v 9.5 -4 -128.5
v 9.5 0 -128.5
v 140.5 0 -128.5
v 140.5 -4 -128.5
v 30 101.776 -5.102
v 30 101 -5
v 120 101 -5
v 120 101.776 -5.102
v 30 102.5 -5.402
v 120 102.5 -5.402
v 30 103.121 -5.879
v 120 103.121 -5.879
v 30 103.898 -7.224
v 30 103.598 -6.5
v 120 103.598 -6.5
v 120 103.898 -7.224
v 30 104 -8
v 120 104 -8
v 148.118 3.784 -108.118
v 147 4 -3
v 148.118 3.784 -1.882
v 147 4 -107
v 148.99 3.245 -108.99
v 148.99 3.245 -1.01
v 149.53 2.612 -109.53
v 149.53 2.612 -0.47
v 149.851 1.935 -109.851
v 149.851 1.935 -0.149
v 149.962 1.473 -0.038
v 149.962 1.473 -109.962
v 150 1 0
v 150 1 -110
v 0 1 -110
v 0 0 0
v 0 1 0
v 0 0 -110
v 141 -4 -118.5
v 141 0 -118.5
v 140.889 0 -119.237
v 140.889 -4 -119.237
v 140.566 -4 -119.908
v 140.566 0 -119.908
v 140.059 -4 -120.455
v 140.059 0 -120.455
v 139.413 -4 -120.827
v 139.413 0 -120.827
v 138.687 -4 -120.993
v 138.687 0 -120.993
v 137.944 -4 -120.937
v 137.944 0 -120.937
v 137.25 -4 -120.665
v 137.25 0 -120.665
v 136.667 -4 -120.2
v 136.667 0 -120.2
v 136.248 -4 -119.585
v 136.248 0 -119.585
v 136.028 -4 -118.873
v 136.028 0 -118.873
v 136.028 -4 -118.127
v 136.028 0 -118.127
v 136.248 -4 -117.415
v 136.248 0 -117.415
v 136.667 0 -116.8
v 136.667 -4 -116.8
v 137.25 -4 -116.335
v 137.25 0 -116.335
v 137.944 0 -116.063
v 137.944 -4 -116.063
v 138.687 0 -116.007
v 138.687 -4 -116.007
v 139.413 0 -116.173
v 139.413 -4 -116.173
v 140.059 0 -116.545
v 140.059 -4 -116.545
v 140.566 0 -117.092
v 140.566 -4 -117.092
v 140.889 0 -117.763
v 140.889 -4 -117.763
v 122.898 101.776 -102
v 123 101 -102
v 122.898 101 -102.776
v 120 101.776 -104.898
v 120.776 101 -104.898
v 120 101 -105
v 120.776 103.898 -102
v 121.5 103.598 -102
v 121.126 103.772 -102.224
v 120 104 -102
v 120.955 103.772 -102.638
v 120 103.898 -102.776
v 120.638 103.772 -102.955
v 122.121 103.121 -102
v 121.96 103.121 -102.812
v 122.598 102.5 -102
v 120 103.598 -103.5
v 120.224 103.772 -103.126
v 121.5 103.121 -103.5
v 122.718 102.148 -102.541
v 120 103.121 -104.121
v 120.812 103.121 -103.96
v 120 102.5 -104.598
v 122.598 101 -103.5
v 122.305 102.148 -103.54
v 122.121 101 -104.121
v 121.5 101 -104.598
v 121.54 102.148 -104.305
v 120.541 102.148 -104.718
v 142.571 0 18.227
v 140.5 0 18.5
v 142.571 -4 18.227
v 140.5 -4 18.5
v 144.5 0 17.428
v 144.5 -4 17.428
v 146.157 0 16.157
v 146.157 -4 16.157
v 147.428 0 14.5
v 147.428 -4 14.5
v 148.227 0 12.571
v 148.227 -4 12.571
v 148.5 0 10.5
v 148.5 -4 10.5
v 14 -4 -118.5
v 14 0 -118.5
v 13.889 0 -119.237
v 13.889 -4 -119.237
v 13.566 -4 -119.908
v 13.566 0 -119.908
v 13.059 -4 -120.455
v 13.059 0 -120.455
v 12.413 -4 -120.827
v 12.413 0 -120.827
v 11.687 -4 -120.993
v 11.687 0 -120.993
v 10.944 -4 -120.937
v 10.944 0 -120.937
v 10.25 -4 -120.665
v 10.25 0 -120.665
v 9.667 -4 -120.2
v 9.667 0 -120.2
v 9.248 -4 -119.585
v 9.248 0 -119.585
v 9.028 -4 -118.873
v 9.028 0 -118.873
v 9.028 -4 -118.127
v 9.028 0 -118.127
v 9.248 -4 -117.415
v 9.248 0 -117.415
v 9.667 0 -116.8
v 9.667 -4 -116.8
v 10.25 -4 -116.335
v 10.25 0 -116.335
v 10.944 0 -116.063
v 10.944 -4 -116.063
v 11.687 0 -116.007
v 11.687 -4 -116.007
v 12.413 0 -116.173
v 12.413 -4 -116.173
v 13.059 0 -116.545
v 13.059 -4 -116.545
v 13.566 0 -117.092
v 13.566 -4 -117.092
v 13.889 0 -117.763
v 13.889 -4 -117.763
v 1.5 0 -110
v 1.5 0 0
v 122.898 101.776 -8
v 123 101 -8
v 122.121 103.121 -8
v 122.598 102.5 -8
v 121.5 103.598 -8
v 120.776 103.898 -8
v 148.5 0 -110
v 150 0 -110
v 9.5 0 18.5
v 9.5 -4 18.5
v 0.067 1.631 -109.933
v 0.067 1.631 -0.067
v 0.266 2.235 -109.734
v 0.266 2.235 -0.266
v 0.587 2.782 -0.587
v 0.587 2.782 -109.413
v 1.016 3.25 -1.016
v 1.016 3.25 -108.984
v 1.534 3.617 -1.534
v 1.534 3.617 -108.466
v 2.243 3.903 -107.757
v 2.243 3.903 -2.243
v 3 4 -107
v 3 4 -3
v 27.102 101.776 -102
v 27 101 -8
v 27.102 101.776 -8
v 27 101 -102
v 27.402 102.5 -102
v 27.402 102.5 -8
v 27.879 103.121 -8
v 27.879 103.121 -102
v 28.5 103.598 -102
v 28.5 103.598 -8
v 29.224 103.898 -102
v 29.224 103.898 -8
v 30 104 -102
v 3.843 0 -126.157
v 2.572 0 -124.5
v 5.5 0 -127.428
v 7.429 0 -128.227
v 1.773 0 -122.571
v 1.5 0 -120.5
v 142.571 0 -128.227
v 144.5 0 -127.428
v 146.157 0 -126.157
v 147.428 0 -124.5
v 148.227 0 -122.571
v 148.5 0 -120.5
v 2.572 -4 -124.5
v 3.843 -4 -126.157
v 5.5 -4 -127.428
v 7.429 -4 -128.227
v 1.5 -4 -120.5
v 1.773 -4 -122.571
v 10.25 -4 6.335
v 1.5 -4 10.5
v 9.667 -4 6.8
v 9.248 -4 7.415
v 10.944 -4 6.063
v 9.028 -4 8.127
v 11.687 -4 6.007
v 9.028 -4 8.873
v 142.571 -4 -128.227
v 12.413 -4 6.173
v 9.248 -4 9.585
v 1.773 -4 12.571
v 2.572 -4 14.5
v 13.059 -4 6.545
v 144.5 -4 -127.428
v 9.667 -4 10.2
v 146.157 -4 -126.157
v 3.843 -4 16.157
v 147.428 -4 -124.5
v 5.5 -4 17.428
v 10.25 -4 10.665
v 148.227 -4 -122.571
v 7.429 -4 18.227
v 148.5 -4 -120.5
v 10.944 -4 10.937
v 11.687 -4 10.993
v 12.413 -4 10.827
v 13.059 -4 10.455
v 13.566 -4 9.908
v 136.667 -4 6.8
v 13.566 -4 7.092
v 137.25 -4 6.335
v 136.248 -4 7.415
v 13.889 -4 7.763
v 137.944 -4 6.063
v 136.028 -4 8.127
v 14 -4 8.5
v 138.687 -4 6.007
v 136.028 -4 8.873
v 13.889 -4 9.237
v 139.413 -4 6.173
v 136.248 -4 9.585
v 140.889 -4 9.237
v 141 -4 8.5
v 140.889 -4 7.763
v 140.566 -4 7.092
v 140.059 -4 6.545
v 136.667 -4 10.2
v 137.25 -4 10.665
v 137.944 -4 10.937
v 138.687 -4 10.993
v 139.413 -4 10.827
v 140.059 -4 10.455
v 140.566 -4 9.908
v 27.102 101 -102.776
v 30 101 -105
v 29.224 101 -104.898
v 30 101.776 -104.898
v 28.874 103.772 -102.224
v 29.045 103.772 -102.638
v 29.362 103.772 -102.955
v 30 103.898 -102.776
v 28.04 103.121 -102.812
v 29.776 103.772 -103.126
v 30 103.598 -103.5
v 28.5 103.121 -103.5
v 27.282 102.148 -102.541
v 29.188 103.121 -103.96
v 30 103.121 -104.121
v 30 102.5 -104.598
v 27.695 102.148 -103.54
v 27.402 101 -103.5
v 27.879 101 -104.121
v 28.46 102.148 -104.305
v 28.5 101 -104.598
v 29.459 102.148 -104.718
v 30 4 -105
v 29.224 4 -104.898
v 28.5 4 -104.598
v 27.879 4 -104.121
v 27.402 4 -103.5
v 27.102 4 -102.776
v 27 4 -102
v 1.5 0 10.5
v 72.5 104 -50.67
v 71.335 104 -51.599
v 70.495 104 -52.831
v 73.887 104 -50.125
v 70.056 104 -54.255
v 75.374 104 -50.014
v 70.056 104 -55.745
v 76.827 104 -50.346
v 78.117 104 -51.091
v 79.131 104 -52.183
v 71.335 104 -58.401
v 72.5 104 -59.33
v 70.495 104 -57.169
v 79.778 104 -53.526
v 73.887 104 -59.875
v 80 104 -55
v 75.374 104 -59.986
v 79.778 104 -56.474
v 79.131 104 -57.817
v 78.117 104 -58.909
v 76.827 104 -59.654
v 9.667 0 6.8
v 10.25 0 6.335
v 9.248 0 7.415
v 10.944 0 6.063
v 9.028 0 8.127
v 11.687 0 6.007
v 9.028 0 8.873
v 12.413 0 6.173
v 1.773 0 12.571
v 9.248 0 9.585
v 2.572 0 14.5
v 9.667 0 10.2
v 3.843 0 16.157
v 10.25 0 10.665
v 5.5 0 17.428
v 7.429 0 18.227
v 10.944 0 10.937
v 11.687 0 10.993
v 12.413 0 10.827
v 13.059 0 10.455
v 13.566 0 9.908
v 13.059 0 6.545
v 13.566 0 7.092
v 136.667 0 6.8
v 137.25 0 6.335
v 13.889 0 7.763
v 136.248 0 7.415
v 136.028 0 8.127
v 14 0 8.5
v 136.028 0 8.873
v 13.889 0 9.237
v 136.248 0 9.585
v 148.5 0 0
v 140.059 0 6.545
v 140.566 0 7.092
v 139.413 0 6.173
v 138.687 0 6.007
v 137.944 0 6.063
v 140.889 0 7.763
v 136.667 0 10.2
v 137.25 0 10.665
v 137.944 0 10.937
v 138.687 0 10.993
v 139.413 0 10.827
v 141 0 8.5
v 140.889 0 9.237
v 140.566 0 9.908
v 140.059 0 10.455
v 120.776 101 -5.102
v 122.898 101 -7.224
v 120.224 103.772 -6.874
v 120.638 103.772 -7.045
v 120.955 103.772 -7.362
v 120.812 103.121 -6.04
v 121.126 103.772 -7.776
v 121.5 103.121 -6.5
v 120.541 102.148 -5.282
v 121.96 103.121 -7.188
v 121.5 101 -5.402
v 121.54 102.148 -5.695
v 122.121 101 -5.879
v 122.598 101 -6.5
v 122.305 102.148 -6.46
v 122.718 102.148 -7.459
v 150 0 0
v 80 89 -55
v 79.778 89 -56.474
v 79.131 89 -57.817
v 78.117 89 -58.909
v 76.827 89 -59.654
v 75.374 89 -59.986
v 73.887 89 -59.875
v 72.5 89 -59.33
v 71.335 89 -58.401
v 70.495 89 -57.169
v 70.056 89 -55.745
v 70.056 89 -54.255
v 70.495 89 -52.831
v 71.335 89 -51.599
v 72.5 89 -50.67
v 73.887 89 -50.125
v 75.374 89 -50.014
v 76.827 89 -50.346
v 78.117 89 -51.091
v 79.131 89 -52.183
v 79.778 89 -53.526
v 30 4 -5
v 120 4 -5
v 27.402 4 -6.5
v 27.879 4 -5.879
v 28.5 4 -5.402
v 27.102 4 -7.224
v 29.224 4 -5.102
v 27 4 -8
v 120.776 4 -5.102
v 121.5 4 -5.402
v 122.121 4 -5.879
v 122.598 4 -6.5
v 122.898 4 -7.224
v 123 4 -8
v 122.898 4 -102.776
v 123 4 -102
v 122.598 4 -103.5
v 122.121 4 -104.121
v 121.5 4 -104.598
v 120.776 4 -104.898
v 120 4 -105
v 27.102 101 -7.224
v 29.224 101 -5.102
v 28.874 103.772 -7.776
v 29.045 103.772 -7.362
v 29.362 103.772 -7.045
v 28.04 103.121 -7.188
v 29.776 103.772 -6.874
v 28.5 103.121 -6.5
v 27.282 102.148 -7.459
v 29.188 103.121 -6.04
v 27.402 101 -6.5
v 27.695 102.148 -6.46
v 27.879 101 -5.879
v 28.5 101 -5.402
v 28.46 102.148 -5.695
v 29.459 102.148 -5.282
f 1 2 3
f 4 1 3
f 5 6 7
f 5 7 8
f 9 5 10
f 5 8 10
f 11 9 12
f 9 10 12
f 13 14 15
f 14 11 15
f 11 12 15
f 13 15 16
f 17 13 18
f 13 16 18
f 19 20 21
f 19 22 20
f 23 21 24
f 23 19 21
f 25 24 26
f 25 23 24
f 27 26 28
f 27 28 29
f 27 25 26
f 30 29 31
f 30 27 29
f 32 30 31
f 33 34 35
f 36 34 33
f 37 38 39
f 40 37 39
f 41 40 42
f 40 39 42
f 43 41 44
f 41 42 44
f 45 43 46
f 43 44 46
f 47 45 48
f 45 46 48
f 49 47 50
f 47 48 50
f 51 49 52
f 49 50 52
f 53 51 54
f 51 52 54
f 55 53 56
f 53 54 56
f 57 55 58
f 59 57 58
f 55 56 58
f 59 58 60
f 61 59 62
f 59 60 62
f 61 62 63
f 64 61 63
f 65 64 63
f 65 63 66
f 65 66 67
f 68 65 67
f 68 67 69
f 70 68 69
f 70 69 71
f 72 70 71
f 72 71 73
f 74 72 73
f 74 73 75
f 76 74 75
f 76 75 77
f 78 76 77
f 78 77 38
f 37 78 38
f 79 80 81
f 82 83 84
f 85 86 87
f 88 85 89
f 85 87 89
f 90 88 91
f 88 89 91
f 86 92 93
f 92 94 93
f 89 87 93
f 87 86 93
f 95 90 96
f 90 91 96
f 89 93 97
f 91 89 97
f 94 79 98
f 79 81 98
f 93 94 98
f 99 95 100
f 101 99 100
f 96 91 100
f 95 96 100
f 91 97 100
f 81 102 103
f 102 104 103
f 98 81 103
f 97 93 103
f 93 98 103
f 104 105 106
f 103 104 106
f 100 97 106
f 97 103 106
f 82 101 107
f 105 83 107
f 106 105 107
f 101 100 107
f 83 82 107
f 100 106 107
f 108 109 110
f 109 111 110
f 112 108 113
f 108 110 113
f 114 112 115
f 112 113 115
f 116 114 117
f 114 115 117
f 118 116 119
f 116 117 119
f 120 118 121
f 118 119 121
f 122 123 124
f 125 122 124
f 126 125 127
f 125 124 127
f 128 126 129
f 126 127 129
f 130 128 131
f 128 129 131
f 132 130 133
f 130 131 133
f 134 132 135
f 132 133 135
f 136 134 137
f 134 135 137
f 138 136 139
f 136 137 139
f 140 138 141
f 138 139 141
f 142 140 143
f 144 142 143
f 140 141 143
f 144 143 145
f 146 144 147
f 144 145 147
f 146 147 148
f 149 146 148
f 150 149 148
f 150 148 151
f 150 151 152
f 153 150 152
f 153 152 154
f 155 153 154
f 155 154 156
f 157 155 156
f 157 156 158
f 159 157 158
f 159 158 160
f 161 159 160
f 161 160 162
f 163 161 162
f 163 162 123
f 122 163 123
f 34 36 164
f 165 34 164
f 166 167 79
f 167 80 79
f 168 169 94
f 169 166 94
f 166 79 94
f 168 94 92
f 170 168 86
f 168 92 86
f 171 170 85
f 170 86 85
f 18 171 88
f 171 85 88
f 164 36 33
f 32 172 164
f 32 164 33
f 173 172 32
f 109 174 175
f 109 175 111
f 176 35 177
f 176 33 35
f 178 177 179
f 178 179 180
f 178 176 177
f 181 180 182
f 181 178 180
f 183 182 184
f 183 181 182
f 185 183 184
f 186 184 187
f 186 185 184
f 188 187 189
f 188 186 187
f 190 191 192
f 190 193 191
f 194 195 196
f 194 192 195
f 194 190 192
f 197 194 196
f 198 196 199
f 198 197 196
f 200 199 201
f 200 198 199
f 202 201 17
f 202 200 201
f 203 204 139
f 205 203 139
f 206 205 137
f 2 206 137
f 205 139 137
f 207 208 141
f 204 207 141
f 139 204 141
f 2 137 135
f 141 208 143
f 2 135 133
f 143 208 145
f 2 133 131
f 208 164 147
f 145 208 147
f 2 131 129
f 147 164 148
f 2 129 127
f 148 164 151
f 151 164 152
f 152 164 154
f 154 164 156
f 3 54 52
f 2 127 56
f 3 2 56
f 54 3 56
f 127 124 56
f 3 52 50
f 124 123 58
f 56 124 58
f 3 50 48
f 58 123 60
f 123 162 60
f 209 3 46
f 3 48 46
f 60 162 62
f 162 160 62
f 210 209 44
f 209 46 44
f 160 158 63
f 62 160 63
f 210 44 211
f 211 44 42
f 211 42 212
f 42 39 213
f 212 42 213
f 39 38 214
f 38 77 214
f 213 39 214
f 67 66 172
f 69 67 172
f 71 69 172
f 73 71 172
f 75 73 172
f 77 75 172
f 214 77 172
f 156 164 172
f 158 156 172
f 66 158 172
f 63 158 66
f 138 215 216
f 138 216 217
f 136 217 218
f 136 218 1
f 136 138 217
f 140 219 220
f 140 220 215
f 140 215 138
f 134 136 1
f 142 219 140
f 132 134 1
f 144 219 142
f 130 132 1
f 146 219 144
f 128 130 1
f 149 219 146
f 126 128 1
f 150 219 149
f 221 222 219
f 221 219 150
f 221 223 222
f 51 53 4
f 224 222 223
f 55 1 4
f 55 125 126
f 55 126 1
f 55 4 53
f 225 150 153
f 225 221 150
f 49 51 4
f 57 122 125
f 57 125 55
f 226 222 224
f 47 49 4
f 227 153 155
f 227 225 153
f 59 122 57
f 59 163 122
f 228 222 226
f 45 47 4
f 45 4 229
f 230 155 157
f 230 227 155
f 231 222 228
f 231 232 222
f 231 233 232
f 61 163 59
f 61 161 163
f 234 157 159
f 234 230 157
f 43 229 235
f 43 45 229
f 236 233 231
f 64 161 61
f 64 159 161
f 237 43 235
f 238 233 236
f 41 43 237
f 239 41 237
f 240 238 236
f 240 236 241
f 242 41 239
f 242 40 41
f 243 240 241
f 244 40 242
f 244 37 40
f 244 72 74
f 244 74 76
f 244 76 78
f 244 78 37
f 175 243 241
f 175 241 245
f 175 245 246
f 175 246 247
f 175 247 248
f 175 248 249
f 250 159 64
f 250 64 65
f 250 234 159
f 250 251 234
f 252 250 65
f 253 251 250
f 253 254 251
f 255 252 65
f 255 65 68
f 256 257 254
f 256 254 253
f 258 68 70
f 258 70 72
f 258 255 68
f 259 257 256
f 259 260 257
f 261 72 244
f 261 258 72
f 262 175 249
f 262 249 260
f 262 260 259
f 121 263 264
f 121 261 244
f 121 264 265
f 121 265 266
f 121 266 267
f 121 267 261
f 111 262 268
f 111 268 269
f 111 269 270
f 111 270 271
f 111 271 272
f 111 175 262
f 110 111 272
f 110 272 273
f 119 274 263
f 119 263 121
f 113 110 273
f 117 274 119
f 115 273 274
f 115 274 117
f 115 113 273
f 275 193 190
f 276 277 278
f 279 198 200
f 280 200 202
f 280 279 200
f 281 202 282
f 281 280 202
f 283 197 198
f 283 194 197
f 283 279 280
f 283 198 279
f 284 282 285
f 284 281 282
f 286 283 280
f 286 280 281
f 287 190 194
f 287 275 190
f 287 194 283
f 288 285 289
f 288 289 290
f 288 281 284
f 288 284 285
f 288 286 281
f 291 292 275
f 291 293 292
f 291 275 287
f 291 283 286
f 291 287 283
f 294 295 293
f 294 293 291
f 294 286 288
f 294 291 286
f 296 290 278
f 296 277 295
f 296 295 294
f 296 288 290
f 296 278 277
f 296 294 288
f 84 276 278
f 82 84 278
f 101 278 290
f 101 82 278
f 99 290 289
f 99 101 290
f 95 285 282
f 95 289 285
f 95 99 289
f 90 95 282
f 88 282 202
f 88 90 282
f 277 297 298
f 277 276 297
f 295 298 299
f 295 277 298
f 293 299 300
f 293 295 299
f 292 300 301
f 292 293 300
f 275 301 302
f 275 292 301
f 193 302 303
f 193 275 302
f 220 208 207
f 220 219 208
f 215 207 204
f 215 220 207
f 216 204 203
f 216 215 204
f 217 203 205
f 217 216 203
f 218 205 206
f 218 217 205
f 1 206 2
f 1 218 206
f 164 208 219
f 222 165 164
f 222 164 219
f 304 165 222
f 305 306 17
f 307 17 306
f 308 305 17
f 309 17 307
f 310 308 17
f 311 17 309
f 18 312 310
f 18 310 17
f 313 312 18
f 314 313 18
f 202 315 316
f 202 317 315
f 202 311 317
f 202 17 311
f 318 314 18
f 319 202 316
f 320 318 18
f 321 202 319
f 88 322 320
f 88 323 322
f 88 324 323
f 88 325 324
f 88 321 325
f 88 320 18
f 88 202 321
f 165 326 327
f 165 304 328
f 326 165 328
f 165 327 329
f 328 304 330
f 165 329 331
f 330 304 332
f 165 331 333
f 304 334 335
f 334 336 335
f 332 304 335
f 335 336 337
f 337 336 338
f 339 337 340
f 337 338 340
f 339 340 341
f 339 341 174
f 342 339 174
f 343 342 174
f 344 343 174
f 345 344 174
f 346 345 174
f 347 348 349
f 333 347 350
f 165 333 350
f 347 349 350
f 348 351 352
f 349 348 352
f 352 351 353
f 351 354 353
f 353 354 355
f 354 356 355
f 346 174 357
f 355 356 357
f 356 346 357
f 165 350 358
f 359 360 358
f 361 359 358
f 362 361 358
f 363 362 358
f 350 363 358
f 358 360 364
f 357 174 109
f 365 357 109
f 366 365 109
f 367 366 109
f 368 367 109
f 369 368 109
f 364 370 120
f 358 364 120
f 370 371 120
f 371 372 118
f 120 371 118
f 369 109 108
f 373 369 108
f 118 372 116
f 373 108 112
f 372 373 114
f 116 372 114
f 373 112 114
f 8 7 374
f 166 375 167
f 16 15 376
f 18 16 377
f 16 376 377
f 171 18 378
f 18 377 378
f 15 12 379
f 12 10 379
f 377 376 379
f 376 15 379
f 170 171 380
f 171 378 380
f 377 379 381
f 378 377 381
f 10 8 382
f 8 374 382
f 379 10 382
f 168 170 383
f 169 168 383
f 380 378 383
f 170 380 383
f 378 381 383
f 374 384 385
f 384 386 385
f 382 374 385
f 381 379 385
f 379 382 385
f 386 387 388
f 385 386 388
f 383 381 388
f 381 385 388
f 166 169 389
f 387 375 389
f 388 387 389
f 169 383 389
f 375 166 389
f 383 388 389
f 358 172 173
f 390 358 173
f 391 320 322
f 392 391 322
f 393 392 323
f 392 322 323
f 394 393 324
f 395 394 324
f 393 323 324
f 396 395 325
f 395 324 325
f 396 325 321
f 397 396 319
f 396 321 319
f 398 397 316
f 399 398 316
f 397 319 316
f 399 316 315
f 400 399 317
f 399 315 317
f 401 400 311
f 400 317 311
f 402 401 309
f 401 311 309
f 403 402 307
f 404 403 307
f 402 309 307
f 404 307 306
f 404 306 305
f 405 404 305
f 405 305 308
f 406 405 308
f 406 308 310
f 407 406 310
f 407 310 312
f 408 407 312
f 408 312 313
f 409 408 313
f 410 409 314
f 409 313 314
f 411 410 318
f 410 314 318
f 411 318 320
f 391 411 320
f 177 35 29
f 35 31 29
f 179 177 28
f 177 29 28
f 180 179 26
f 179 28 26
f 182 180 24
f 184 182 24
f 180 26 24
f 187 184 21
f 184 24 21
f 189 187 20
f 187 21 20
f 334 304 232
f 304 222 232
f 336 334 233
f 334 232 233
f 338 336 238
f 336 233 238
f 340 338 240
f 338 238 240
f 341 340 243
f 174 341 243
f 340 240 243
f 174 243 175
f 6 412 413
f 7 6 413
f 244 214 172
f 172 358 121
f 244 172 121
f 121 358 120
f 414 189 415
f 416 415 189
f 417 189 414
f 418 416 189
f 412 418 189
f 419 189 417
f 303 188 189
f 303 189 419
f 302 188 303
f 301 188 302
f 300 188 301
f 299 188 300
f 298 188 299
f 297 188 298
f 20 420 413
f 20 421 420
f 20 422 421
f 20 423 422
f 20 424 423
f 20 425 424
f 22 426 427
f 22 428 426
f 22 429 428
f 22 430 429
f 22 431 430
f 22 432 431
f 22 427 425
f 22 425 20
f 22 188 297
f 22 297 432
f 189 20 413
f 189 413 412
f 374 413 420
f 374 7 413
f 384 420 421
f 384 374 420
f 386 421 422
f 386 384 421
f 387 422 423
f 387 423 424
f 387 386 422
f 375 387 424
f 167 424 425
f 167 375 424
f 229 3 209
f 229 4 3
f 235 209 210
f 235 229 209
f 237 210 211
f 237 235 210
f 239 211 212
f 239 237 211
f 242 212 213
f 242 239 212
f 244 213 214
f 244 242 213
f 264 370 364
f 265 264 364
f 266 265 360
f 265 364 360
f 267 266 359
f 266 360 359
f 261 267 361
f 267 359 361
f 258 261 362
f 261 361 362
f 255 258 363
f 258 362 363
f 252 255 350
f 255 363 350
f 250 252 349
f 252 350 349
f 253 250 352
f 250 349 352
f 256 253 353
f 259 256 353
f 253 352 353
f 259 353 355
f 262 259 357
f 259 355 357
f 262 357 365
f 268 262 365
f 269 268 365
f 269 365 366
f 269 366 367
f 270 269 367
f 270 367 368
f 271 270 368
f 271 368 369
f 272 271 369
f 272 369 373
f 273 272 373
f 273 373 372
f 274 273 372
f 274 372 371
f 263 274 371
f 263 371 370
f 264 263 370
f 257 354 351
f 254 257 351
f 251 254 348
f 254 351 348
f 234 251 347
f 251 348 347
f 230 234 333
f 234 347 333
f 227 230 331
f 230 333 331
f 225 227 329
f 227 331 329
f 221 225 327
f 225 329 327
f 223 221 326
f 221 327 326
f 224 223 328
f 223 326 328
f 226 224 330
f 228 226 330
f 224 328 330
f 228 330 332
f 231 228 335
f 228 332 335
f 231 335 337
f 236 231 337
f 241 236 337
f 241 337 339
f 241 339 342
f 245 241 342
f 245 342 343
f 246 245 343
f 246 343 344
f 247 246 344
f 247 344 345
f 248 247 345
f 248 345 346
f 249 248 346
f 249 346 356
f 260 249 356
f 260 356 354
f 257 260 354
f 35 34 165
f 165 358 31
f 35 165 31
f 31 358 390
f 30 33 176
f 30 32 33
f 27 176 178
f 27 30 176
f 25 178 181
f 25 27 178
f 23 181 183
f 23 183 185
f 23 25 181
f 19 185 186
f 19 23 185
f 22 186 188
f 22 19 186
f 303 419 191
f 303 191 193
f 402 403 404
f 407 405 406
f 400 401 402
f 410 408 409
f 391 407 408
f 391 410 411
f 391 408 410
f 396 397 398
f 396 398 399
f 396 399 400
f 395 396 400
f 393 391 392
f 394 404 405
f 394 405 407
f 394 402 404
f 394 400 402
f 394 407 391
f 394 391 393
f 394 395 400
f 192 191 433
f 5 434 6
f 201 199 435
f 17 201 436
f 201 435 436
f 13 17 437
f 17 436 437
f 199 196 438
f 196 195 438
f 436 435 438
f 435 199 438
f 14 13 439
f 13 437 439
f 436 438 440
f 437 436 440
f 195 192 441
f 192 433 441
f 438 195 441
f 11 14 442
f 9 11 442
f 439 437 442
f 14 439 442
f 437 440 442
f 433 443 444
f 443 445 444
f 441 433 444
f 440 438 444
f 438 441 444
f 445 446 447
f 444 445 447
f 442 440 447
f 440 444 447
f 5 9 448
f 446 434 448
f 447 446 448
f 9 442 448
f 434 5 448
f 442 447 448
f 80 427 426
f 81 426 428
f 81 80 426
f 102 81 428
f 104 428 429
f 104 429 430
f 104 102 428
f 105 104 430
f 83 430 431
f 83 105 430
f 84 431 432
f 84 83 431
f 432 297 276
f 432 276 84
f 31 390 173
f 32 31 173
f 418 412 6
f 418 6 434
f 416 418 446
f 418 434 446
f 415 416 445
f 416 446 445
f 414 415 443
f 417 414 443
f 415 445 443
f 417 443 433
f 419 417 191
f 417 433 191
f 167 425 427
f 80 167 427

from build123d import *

# Parameters (mm, degrees)
SKETCH1_W           = 150
SKETCH1_H           = 110
BOSS_EXTRUDE1_DEPTH = 4
SKETCH2_W           = 96
SKETCH2_H           = 100
BOSS_EXTRUDE2_DEPTH = 100
FILLET1_R           = 3
SKETCH4_R           = 5
CUT_EXTRUDE1_DEPTH  = 15
SKETCH5_W           = 147
SKETCH5_H           = 147
BOSS_EXTRUDE3_DEPTH = 4
SKETCH6_R           = 2.5
CUT_EXTRUDE2_DEPTH  = 5
FILLET2_R           = 8


with BuildPart() as part:
    # Sketch1 → Boss-Extrude1 (new body)
    with BuildSketch(Plane(origin=(0, 0, 0), x_dir=(1, 0, 0), z_dir=(0, 1, 0))):
        with Locations((75, 55)):
            Rectangle(SKETCH1_W, SKETCH1_H)
    extrude(amount=BOSS_EXTRUDE1_DEPTH)

    # Sketch2 → Boss-Extrude2 (add)
    with BuildSketch(Plane(origin=(0, 4, 0), x_dir=(1, 0, 0), z_dir=(0, 1, 0))):
        with Locations((75, 55)):
            Rectangle(SKETCH2_W, SKETCH2_H)
    extrude(amount=BOSS_EXTRUDE2_DEPTH)

    # Fillet1
    fillet1_edges = [part.edges().sort_by_distance(p)[0] for p in [
        (150, 4, -55),
        (27, 54, -105),
        (27, 54, -5),
        (75, 4, -110),
        (123, 54, -5),
        (123, 54, -105),
        (27, 104, -55),
        (75, 104, -5),
        (123, 104, -55),
        (75, 104, -105),
        (0, 4, -55),
        (75, 4, 0),
    ]]
    fillet(fillet1_edges, radius=FILLET1_R)

    # Sketch4 → Cut-Extrude1 (cut)
    with BuildSketch(Plane(origin=(0, 104, 0), x_dir=(1, 0, 0), z_dir=(0, 1, 0))):
        with Locations((75, 55)):
            Circle(SKETCH4_R)
    extrude(amount=-CUT_EXTRUDE1_DEPTH, mode=Mode.SUBTRACT)

    # Sketch5 → Boss-Extrude3 (add)
    with BuildSketch(Plane.XZ):
        with Locations((75, -55)):
            Rectangle(SKETCH5_W, SKETCH5_H)
    extrude(amount=BOSS_EXTRUDE3_DEPTH)

    # Sketch6 → Cut-Extrude2 (cut, through all)
    with BuildSketch(Plane(origin=(0, 0, 0), x_dir=(1, 0, 0), z_dir=(0, 1, 0))):
        with Locations((11.5, 118.5)):
            Circle(SKETCH6_R)
        with Locations((138.5, 118.5)):
            Circle(SKETCH6_R)
        with Locations((11.5, -8.5)):
            Circle(SKETCH6_R)
        with Locations((138.5, -8.5)):
            Circle(SKETCH6_R)
    extrude(amount=-CUT_EXTRUDE2_DEPTH, mode=Mode.SUBTRACT)

    # Fillet2
    fillet2_edges = [part.edges().sort_by_distance(p)[0] for p in [
        (1.5, -2, 18.5),
        (1.5, -2, -128.5),
        (148.5, -2, -128.5),
        (148.5, -2, 18.5),
    ]]
    fillet(fillet2_edges, radius=FILLET2_R)


solid = part.part
